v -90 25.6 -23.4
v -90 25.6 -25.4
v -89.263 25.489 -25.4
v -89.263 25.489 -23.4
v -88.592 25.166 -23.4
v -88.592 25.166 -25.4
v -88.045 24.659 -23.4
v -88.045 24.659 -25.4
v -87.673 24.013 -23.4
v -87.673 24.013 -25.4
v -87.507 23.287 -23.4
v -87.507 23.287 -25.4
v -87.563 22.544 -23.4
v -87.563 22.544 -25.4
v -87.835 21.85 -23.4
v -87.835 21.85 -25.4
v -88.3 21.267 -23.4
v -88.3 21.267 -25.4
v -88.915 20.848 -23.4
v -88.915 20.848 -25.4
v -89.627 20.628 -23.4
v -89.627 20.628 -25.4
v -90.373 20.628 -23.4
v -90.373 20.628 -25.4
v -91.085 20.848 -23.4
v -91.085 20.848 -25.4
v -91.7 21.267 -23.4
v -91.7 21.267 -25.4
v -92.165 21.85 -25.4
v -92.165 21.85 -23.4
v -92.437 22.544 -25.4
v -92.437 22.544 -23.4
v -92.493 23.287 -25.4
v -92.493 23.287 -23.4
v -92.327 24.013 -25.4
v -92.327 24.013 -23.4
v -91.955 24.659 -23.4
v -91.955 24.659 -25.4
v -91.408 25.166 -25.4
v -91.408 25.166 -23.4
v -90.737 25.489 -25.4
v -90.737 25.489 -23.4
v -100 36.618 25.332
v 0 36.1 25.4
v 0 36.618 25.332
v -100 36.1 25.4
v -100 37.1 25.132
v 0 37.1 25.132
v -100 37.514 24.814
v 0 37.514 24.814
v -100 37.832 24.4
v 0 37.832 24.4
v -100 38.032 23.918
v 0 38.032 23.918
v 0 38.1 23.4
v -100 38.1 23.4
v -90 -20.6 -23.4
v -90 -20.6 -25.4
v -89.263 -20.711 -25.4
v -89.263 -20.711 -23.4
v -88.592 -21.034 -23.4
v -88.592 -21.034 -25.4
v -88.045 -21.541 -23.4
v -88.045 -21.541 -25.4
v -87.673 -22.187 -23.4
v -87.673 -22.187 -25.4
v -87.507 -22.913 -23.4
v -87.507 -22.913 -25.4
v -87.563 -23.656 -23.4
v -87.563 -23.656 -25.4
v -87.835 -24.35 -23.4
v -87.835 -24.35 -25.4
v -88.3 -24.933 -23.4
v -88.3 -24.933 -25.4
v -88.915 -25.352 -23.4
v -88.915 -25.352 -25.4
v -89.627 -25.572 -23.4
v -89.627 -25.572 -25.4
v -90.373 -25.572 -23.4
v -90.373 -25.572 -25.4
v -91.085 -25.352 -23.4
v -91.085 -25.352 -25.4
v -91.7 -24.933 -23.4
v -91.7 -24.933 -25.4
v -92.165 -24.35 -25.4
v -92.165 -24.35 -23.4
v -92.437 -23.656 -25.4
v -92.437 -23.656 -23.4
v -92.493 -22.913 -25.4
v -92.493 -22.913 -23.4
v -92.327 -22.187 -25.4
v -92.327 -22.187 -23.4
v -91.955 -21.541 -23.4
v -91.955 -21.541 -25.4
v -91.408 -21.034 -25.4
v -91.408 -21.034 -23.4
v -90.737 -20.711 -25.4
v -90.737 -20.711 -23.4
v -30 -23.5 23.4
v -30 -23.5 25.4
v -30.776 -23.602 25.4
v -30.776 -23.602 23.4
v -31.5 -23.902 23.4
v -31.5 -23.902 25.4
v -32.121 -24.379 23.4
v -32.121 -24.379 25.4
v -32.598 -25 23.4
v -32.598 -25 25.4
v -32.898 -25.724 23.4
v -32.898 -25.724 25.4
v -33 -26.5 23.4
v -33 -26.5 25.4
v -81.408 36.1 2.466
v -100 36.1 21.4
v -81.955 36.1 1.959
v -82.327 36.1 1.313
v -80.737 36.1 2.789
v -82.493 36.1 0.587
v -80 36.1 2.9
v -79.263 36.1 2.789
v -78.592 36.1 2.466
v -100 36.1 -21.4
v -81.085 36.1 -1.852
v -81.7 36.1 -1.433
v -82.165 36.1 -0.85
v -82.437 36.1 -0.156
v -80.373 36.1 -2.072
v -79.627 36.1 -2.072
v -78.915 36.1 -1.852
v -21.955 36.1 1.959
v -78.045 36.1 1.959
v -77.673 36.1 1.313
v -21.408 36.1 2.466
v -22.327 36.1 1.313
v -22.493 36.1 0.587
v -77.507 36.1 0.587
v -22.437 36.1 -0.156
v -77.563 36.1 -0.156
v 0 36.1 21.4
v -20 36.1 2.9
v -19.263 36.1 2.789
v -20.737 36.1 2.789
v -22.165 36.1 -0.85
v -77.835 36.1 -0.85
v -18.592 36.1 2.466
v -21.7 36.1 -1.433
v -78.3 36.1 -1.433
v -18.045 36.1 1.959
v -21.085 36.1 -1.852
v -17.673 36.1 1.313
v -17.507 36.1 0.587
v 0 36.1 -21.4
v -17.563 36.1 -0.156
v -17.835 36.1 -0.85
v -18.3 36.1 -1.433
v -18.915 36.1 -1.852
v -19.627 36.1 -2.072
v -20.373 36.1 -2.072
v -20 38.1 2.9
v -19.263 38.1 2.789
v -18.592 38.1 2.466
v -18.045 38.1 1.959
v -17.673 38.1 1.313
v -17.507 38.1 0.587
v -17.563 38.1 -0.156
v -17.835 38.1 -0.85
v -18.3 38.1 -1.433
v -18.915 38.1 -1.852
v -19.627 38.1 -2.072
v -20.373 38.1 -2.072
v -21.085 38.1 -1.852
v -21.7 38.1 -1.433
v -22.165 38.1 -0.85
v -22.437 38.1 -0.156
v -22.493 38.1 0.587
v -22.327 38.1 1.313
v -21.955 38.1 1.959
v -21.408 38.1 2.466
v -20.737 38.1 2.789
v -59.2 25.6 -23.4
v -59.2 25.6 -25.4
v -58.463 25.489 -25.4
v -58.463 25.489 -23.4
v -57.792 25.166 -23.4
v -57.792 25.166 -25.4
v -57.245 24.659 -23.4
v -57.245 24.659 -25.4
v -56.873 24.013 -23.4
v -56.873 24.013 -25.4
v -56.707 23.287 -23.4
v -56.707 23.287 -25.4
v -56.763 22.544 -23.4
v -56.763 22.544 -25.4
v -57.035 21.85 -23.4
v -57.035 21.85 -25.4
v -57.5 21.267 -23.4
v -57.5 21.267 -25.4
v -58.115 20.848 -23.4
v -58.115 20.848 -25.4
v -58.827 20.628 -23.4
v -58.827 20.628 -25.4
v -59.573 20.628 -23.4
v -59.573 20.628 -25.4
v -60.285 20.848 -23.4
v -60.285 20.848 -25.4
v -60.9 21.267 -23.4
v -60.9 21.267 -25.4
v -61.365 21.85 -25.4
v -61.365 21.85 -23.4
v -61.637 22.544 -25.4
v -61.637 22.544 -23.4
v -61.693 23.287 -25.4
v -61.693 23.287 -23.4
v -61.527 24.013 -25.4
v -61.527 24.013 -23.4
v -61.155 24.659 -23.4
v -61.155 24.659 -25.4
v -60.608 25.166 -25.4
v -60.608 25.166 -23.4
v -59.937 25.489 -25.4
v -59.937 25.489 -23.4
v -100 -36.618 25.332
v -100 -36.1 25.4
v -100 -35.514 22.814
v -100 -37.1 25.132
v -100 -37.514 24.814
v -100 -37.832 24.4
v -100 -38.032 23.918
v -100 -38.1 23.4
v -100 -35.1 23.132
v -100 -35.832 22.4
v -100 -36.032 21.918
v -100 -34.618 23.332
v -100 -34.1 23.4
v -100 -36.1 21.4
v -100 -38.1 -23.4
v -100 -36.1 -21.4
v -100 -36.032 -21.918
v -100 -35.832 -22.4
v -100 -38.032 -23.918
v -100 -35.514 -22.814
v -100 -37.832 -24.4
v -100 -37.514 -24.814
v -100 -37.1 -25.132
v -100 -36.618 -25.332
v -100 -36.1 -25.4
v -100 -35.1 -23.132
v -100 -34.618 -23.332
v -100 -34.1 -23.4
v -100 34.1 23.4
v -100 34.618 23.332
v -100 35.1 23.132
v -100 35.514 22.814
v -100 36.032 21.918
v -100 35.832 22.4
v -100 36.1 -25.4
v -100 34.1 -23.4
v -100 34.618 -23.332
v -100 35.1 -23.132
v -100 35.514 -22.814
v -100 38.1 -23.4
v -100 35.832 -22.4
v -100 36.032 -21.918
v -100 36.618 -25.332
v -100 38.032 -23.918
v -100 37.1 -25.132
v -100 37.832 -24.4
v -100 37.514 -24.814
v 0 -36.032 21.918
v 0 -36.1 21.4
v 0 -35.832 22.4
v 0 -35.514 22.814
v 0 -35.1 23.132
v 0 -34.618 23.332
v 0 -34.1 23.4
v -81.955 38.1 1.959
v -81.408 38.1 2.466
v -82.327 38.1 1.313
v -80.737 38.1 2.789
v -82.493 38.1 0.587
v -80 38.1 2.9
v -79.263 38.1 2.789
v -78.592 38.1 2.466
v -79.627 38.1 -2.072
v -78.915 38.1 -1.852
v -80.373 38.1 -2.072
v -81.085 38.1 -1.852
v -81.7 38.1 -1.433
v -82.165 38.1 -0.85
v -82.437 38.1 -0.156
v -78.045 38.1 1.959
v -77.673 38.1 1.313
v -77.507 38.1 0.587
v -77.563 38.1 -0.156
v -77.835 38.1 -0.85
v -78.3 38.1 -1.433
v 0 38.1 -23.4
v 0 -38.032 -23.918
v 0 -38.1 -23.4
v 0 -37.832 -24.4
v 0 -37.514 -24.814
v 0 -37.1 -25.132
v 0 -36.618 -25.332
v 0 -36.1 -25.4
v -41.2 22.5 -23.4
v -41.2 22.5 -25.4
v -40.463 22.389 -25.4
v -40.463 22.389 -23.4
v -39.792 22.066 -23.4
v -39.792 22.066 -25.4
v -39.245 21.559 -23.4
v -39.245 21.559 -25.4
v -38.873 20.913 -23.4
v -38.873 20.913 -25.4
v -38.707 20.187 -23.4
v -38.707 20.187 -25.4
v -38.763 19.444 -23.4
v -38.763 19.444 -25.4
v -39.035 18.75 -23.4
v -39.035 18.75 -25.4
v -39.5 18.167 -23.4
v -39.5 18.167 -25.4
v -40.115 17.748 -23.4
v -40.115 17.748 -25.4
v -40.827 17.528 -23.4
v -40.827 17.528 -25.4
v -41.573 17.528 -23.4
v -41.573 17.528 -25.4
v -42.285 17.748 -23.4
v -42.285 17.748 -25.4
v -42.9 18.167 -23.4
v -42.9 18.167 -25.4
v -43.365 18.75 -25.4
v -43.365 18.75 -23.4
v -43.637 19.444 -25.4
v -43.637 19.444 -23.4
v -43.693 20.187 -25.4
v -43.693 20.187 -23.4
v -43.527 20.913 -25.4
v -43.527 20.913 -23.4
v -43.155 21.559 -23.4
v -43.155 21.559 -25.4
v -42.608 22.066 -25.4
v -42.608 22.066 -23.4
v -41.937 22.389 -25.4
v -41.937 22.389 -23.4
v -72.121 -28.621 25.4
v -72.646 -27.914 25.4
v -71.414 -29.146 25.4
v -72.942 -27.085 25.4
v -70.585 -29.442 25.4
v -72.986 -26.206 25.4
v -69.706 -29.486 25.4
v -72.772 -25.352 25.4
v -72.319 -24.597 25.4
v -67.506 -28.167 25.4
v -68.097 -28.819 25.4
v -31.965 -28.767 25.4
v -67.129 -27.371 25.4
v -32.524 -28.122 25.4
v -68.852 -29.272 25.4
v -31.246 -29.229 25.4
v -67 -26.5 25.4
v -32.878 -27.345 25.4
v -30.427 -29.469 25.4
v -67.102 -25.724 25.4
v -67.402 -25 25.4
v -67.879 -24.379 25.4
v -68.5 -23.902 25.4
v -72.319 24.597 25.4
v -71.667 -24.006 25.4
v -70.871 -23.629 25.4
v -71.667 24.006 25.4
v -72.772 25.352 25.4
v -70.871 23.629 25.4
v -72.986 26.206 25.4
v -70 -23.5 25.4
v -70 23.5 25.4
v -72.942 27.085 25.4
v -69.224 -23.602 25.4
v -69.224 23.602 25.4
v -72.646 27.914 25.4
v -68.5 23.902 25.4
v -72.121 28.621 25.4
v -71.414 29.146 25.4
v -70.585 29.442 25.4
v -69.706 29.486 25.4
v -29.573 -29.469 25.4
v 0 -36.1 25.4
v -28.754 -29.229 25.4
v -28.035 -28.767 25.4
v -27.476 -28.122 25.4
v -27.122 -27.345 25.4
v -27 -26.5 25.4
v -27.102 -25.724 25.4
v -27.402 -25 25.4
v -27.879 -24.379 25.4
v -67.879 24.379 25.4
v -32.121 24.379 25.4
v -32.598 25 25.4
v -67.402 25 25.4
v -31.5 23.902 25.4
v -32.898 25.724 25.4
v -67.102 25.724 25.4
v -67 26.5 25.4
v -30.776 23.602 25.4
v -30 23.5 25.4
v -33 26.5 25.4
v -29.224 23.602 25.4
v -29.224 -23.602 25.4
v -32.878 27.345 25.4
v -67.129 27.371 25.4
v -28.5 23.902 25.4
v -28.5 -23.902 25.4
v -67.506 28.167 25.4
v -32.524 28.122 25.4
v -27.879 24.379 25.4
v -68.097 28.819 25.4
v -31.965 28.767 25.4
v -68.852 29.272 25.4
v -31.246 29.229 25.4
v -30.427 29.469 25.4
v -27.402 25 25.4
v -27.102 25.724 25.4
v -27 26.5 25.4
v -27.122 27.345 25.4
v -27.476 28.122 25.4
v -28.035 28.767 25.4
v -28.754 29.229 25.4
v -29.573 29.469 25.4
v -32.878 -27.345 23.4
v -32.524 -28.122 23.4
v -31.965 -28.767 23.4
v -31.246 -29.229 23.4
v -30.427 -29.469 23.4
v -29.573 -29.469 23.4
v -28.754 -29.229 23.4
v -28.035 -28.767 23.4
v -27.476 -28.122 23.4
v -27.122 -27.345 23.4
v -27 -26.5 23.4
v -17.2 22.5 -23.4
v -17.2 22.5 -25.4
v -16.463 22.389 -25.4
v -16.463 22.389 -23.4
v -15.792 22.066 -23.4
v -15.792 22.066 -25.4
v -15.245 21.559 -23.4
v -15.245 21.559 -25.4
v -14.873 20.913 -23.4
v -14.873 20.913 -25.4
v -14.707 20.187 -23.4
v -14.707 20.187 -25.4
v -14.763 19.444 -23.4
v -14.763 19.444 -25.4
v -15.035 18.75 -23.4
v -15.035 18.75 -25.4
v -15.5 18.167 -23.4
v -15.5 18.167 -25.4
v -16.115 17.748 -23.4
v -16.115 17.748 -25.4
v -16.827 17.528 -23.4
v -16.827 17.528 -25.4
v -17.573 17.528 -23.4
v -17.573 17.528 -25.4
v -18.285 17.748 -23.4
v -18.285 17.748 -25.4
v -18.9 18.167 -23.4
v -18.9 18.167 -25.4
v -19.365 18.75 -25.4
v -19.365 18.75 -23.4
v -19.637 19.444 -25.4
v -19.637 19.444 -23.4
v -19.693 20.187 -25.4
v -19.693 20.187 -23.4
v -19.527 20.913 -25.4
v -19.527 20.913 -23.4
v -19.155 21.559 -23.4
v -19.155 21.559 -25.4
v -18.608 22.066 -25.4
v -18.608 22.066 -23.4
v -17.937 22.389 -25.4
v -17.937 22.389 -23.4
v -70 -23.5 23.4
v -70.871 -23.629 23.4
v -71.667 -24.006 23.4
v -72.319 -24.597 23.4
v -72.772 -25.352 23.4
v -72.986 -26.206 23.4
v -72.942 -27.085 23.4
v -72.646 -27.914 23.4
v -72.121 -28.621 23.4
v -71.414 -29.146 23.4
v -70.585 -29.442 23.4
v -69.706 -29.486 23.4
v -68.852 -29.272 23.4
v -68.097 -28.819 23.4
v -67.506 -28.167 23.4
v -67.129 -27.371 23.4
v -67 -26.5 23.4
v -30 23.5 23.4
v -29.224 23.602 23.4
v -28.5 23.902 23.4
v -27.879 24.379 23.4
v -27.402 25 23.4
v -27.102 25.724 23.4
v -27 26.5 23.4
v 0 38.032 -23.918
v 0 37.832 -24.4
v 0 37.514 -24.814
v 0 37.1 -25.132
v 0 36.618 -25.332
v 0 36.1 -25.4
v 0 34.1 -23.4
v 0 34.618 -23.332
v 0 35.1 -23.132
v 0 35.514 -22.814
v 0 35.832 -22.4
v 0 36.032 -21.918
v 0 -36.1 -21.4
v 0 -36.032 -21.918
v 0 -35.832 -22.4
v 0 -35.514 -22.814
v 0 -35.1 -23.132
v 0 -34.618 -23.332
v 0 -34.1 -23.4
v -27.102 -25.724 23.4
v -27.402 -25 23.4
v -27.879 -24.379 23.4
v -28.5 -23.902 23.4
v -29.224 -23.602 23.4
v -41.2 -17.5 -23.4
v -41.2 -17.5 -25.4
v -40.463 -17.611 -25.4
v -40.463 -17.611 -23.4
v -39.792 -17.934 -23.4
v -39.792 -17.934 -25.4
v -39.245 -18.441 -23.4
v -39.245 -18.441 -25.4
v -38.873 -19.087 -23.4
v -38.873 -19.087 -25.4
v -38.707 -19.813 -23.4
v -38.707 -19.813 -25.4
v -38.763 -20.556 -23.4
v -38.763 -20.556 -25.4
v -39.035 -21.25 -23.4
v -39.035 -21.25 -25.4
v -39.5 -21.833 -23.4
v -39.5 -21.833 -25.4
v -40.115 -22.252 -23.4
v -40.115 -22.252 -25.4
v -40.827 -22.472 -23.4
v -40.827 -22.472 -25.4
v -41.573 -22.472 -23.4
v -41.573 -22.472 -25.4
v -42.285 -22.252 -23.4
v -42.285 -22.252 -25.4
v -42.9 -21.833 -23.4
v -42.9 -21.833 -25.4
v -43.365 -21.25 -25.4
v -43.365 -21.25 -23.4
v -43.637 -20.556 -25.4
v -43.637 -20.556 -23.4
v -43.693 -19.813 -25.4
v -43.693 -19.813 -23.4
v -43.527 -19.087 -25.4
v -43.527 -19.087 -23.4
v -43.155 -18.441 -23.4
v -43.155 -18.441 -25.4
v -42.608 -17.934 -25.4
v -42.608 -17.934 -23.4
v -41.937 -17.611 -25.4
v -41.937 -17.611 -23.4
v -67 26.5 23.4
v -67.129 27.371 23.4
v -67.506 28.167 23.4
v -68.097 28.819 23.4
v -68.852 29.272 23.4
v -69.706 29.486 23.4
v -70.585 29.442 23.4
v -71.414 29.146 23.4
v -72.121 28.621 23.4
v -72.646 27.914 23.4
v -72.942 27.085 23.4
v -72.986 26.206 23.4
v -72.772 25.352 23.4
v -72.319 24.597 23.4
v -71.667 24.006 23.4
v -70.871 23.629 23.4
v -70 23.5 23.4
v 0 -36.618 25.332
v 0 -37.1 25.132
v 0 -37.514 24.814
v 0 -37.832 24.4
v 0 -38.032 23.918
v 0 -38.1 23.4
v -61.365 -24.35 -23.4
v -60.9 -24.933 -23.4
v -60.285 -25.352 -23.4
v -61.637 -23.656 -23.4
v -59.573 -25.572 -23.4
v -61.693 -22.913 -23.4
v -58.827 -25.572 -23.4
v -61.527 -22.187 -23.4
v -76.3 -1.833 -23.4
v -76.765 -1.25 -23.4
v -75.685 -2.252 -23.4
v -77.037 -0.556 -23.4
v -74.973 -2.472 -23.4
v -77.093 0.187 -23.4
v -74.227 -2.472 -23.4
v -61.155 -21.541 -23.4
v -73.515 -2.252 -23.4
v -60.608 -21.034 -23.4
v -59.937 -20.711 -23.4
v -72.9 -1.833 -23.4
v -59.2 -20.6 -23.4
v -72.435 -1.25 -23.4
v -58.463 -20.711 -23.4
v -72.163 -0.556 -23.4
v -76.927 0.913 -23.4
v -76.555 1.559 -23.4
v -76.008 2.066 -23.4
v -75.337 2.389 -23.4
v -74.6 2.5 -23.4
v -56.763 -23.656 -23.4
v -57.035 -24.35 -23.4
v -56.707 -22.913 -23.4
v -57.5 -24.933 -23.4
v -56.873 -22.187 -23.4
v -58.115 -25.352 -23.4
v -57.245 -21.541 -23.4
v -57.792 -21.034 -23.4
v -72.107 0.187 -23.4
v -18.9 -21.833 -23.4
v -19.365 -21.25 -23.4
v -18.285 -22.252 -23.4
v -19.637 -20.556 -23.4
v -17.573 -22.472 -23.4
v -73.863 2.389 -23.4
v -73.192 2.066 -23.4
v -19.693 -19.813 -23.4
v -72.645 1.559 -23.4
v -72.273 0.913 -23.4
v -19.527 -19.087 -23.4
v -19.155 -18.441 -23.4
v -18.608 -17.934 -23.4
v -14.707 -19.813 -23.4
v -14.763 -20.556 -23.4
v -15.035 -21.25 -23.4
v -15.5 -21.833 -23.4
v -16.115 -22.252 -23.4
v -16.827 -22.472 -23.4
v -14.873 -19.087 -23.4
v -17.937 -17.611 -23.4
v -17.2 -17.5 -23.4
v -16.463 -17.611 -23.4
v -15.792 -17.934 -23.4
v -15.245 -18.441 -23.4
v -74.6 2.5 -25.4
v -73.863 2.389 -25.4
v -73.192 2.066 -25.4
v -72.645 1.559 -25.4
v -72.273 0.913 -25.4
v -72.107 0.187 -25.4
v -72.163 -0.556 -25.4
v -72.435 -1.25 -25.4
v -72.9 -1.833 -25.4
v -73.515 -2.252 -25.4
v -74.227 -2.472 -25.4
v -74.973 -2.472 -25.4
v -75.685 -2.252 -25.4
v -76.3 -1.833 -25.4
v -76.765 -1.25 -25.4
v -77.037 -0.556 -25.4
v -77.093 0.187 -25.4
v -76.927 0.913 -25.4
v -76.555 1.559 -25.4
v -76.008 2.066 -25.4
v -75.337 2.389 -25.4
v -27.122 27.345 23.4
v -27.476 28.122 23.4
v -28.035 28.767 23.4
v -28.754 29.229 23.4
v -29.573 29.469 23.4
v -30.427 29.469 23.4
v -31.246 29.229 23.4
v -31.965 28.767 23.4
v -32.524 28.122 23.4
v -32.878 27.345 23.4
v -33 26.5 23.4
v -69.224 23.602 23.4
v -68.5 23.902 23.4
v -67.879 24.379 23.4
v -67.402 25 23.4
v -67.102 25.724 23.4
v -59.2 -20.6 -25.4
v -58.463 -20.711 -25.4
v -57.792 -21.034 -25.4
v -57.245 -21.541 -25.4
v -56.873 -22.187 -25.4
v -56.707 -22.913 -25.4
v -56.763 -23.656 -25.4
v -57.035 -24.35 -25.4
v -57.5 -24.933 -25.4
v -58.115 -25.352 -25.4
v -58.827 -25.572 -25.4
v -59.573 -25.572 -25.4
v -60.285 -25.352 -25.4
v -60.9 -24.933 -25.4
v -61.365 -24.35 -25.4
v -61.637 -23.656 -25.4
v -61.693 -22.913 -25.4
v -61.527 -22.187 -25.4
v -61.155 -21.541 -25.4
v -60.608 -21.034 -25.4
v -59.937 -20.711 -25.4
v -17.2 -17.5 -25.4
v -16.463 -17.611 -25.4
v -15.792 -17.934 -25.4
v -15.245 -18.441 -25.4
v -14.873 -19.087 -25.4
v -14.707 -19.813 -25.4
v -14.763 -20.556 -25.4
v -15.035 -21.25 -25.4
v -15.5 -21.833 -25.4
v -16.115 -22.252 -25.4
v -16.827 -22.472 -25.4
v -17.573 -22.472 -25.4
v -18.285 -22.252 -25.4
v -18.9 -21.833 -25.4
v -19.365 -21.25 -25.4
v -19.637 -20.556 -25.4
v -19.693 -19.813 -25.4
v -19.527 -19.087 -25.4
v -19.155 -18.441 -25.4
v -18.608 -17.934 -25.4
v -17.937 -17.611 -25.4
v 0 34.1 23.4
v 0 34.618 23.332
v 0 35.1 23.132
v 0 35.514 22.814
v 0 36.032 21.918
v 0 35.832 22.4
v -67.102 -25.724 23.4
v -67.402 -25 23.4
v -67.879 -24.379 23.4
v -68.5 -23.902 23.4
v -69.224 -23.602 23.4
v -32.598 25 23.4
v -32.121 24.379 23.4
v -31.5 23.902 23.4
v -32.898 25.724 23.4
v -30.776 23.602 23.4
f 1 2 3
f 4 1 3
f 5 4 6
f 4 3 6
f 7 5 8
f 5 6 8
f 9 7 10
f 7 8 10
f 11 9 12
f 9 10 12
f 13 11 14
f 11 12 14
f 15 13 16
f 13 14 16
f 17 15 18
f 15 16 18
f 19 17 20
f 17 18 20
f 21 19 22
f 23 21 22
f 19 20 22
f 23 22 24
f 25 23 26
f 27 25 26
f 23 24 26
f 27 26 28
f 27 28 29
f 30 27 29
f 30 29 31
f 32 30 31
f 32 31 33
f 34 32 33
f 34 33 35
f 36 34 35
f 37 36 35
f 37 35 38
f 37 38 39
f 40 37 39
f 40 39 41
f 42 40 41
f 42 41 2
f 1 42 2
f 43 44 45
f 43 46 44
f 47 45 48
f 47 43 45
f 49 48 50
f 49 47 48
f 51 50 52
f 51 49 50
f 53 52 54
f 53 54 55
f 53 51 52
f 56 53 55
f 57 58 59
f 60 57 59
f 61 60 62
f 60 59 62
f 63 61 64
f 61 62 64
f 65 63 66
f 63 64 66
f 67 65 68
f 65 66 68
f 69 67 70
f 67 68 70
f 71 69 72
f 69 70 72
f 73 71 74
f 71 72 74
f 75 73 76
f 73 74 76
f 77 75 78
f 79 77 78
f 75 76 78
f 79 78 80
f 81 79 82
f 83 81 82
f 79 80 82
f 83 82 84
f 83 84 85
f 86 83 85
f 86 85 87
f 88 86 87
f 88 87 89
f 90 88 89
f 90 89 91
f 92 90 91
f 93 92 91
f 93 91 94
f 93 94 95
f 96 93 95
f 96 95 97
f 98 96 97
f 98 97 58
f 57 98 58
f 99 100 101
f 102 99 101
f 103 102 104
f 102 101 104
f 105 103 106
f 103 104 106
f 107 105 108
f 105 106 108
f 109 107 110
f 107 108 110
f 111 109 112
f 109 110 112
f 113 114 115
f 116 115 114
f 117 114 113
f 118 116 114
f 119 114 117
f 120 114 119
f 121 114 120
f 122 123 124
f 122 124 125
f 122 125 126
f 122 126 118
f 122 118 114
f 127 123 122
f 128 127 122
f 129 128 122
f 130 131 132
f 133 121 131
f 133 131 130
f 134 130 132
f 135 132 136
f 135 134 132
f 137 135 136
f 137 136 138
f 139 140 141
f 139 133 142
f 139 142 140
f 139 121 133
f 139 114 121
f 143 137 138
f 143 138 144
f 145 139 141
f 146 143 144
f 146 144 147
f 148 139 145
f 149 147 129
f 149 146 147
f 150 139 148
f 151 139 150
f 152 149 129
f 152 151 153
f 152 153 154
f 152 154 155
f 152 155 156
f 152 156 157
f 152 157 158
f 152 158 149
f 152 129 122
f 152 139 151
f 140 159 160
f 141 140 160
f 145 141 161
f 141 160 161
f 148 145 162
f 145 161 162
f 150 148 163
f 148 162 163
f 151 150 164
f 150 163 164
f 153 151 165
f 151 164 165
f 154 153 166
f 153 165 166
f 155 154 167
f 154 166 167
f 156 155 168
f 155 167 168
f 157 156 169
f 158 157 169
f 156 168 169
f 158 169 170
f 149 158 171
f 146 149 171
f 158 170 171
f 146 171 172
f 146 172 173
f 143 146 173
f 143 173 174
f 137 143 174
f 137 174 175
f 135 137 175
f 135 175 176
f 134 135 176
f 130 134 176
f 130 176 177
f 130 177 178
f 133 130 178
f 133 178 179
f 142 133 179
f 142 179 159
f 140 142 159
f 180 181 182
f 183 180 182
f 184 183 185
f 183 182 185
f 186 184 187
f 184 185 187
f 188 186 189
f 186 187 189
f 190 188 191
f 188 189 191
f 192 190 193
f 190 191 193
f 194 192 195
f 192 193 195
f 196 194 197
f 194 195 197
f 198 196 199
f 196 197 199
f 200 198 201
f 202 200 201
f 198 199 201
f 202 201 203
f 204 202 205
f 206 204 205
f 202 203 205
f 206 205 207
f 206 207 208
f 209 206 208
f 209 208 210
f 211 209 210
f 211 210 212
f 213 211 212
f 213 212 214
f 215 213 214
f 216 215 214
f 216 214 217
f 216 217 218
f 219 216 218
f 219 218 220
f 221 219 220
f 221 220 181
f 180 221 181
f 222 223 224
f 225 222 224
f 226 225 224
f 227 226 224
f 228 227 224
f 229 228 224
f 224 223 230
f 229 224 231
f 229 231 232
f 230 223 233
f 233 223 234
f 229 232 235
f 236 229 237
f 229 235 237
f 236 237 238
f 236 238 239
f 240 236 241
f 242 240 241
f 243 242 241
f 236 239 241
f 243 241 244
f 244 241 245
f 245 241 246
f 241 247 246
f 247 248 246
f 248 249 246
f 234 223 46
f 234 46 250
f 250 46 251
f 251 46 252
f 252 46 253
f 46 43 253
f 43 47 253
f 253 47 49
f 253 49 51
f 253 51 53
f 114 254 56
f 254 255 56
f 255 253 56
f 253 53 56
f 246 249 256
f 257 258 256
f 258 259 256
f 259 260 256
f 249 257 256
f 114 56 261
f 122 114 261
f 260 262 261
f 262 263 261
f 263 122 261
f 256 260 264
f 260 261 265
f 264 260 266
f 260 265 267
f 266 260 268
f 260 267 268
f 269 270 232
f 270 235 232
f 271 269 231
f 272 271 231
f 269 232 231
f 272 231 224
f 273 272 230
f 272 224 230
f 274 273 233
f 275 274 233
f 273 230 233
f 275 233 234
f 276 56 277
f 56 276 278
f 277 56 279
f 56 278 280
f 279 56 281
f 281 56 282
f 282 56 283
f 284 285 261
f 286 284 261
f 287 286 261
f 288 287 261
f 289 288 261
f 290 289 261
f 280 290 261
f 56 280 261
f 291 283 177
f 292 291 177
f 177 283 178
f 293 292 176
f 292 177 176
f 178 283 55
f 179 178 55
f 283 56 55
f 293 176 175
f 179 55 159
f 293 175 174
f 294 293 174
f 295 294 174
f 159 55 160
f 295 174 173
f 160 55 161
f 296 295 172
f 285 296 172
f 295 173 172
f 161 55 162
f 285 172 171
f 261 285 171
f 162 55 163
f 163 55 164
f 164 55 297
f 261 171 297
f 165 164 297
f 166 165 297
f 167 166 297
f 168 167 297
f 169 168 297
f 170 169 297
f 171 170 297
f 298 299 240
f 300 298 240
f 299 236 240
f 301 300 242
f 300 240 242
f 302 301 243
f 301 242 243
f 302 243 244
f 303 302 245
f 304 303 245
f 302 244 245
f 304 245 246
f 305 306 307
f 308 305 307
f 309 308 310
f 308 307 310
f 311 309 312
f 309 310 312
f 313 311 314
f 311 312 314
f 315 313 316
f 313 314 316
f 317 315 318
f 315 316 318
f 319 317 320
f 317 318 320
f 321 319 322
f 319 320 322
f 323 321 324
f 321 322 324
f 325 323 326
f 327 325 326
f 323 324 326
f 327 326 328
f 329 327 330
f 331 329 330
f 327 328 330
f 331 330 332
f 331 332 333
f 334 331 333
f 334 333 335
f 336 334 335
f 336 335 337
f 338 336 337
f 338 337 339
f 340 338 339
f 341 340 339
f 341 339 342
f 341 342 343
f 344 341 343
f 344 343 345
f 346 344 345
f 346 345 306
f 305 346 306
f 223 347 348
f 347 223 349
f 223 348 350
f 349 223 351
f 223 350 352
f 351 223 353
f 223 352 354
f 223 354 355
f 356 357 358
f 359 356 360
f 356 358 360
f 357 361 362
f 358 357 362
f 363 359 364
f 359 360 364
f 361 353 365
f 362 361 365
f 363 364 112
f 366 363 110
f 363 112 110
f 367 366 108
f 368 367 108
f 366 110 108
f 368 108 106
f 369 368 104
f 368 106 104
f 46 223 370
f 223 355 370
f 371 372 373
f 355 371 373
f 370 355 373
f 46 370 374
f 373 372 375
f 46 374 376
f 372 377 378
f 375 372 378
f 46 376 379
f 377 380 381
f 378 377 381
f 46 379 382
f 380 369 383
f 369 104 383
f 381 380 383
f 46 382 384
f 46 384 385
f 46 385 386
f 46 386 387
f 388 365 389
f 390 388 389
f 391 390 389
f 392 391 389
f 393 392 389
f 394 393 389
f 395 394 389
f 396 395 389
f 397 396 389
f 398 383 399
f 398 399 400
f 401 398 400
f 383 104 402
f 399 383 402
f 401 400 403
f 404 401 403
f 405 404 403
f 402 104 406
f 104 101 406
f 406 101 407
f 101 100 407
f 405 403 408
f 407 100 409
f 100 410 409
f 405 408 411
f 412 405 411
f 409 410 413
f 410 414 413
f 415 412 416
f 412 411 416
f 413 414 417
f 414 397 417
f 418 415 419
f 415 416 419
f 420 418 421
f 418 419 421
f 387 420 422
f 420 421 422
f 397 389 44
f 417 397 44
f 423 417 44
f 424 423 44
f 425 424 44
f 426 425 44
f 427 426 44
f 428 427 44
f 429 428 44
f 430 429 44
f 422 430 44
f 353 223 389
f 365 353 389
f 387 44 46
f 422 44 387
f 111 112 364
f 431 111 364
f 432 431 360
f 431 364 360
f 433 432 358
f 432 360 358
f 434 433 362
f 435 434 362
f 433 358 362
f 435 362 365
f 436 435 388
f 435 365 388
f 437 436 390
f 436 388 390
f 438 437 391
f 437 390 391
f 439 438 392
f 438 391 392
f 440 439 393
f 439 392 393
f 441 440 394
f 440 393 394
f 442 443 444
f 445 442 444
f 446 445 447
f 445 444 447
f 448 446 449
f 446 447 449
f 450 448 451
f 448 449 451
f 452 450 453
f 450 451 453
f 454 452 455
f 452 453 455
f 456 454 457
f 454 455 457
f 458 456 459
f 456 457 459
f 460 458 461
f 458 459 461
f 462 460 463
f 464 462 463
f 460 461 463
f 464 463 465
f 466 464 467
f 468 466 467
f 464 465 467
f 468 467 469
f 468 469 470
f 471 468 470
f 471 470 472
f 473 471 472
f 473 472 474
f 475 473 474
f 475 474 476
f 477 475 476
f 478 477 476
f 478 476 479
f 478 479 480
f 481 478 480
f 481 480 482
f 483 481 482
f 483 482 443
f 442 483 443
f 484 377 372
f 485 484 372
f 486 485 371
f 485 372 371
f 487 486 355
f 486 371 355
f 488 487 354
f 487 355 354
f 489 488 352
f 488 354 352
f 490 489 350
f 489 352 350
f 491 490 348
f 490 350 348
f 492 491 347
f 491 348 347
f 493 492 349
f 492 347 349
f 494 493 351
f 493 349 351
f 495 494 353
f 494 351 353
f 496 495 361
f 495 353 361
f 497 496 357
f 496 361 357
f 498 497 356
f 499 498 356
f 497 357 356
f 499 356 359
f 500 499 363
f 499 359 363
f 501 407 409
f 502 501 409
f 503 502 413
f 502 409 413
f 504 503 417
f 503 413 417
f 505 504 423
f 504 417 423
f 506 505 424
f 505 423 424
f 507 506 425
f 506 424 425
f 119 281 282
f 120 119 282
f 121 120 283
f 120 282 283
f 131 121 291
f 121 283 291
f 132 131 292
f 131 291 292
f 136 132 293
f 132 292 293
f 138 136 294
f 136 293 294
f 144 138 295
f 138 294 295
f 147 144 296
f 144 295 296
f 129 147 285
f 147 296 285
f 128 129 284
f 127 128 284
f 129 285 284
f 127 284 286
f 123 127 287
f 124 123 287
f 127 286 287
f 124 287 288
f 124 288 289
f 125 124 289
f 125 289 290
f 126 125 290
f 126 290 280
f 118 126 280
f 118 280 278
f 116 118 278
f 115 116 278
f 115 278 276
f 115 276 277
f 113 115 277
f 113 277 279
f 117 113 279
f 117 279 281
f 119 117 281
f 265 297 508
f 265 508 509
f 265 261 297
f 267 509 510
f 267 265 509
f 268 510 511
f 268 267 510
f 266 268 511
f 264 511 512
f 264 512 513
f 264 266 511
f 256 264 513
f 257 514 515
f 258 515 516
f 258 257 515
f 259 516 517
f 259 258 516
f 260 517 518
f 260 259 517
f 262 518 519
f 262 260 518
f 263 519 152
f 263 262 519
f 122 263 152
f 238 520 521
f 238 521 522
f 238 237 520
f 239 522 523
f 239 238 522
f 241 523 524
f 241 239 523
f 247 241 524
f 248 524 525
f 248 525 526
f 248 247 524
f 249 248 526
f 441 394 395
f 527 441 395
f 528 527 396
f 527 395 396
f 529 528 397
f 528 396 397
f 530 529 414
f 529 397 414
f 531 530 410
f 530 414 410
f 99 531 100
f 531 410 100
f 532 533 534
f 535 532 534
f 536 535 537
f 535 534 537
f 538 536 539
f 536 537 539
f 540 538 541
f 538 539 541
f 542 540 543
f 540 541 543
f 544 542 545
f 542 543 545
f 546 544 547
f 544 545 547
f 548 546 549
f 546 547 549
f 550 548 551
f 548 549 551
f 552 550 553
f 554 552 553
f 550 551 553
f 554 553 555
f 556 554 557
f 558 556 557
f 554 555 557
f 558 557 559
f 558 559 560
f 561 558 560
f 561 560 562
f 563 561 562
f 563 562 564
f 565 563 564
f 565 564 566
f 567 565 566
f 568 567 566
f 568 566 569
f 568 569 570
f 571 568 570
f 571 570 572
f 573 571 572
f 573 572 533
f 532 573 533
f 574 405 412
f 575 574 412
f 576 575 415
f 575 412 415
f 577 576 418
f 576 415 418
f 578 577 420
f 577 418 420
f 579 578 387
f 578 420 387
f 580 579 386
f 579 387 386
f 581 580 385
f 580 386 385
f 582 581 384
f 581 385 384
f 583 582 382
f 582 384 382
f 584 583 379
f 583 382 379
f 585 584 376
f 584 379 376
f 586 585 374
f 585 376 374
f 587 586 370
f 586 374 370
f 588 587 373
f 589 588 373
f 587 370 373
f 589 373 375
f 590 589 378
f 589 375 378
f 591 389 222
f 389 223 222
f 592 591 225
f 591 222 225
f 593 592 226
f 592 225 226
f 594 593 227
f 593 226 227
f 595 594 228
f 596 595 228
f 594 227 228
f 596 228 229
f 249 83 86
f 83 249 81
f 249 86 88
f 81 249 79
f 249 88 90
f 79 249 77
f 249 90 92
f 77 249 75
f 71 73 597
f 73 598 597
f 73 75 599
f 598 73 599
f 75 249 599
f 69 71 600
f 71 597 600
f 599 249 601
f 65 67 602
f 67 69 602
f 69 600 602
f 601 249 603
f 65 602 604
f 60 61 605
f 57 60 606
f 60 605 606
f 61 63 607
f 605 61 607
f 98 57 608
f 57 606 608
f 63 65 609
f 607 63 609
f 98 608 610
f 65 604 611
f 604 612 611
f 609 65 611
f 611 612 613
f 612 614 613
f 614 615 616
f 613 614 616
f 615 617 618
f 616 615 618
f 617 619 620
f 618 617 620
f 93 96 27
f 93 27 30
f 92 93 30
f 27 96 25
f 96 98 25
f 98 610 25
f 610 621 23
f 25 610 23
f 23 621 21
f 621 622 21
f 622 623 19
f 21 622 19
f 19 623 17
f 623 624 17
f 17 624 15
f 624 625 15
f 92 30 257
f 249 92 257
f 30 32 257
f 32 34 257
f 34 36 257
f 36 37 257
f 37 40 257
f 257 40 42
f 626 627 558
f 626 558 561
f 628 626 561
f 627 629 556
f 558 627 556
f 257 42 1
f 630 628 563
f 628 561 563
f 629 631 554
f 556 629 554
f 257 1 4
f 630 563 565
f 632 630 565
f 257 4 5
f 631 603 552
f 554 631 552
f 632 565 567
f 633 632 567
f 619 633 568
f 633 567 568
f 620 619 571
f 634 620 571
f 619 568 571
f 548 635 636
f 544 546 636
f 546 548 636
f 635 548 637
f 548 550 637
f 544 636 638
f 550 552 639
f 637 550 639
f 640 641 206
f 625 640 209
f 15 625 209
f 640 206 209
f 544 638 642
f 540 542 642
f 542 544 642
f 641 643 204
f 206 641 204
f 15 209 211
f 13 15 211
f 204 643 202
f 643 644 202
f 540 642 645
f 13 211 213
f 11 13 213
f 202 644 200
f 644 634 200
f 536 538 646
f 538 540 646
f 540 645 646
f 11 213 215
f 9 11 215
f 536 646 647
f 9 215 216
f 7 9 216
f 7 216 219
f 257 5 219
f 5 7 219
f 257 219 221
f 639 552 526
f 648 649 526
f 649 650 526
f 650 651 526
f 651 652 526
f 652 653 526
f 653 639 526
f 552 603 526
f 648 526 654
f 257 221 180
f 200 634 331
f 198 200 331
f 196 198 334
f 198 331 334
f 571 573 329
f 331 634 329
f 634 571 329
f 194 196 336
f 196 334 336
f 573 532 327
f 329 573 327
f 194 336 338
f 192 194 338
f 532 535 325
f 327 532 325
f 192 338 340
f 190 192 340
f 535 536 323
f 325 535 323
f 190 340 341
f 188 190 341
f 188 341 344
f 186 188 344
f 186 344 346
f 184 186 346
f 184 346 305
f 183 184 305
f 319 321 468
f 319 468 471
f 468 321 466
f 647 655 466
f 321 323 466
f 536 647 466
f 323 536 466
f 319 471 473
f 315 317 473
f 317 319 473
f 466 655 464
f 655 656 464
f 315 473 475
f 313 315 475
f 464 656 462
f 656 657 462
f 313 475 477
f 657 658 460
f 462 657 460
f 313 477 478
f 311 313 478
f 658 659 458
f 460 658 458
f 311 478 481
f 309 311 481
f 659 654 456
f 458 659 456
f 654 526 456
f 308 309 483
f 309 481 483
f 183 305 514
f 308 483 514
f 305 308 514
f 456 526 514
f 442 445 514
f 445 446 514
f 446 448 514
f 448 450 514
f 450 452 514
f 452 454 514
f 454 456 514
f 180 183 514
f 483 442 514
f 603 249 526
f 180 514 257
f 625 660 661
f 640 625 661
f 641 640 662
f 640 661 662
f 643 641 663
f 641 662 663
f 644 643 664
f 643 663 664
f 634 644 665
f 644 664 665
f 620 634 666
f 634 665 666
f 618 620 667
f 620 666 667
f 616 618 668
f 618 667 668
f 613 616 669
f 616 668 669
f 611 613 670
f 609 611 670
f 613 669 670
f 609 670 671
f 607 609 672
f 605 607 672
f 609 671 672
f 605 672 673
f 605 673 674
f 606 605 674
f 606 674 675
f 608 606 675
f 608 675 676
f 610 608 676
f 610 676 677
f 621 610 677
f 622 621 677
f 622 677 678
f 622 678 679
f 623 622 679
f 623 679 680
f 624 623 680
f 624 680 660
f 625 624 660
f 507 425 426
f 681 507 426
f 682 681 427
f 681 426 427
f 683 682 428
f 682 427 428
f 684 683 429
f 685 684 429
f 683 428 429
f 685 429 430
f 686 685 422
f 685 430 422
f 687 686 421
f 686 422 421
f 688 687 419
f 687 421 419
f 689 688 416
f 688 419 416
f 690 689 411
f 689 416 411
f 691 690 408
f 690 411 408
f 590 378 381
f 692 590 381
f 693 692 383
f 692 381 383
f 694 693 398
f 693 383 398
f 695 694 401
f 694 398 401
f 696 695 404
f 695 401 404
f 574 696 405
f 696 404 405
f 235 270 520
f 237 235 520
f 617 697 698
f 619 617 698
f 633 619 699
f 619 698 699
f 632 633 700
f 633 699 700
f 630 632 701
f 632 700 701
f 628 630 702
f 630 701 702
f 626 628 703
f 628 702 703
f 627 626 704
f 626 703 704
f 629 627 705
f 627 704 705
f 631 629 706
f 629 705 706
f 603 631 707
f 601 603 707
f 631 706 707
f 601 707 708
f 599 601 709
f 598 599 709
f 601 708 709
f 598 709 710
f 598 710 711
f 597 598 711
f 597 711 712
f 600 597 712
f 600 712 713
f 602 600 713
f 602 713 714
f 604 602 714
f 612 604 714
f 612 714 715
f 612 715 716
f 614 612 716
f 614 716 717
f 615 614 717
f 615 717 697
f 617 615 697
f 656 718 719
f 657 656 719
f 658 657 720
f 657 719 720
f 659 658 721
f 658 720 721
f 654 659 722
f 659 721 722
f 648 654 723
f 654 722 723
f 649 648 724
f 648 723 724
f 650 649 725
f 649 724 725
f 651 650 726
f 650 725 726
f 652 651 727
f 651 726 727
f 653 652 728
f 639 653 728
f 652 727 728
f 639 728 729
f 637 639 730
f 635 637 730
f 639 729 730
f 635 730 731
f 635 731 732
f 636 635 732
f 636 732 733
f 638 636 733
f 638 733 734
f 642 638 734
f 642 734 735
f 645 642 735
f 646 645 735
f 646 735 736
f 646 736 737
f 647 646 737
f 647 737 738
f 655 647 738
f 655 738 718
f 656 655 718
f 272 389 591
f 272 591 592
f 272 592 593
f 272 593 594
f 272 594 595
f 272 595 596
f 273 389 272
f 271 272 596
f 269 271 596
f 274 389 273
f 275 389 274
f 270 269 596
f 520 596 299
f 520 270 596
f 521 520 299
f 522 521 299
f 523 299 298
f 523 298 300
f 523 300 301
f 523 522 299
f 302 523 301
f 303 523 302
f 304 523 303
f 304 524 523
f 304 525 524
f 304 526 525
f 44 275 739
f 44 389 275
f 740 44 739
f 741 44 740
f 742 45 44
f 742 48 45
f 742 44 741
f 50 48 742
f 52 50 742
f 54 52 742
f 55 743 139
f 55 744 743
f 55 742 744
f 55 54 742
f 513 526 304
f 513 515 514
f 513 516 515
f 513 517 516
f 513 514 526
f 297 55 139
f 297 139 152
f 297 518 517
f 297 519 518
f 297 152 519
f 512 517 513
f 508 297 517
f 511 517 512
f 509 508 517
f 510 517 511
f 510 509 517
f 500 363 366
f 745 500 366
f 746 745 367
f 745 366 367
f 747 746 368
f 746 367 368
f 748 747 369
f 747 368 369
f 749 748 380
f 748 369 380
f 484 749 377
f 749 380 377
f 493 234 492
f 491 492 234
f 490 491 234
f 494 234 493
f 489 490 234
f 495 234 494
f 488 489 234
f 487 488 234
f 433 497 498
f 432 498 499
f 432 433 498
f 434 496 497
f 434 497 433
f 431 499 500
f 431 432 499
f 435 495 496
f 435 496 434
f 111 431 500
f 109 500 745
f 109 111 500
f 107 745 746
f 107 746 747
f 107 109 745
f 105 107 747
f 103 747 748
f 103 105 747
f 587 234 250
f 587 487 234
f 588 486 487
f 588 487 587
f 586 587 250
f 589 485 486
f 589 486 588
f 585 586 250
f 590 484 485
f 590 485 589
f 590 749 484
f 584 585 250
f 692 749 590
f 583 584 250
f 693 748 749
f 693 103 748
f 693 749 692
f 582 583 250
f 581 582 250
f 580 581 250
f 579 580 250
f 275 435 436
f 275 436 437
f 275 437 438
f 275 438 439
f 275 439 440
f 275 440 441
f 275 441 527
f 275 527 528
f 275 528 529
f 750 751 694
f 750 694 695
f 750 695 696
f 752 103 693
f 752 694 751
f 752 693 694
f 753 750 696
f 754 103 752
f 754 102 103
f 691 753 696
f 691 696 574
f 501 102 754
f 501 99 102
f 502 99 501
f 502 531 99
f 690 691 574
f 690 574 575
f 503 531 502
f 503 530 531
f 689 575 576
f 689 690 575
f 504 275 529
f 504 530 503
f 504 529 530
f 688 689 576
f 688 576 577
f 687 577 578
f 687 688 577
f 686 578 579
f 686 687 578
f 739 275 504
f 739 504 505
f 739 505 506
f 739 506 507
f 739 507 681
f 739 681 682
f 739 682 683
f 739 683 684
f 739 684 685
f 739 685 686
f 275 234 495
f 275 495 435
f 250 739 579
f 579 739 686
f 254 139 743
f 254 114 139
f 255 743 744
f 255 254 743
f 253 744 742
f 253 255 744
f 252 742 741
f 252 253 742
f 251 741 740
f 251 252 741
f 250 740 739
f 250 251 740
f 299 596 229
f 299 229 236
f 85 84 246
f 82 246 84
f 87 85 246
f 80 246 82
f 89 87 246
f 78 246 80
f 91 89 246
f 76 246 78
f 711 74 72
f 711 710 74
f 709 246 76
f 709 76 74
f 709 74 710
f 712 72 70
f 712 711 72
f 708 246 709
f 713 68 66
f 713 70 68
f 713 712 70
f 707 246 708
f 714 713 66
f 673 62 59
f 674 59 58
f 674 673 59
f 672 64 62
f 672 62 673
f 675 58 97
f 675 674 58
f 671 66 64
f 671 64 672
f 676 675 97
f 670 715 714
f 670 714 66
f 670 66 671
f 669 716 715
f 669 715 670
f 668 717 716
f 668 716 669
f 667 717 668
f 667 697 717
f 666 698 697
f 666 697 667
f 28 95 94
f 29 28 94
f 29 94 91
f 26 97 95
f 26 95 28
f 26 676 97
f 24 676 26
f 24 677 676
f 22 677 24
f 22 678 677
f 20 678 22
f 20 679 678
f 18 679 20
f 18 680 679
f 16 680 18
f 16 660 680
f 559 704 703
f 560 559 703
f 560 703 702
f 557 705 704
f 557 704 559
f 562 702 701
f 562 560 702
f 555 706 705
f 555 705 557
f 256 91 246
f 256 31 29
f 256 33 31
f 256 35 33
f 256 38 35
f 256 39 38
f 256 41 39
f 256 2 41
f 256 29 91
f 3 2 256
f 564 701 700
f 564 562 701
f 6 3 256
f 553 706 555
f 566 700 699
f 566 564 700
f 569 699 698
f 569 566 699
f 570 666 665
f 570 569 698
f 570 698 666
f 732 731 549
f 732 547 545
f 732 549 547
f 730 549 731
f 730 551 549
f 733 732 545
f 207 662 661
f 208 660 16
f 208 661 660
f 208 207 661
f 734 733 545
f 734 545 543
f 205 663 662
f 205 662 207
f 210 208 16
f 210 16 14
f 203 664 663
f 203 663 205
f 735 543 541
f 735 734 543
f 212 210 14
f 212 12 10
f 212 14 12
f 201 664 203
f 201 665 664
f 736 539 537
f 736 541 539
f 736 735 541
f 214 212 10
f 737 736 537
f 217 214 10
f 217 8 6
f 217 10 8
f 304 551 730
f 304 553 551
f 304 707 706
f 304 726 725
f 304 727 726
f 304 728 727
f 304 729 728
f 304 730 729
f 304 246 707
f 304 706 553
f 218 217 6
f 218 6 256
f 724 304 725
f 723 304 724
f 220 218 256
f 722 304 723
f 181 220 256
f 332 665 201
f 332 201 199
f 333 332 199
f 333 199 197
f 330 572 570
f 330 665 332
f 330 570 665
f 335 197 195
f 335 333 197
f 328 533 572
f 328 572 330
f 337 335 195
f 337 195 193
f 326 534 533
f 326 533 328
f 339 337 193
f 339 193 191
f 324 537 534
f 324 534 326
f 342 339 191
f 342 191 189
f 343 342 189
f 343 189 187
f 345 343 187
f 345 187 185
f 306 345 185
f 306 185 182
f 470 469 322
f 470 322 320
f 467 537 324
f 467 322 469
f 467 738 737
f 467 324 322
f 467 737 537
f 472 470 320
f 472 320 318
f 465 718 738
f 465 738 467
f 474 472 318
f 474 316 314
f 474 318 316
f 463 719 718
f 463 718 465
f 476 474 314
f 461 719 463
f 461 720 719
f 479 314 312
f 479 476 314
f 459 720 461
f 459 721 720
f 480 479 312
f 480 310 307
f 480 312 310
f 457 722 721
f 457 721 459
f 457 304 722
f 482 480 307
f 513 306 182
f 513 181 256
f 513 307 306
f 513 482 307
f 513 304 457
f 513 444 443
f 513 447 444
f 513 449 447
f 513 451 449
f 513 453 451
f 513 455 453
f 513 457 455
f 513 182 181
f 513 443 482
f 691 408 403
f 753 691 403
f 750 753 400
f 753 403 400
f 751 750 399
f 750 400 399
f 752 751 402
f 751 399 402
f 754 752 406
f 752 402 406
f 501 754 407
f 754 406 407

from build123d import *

# Parameters (mm, degrees)
SKETCH1_W             = 50.8
SKETCH1_H             = 76.2
BOSS_EXTRUDE1_DEPTH   = 100
SKETCH2_W             = 46.8
SKETCH2_H             = 72.2
CUT_EXTRUDE1_DEPTH    = 110.985317202
FILLET2_R             = 2
CORTAR_EXTRUIR2_DEPTH = 10
CROQUIS4_R            = 2.5
CORTAR_EXTRUIR5_DEPTH = 10
CROQUIS6_R            = 2.5
CORTAR_EXTRUIR6_DEPTH = 10
CROQUIS7_R            = 2.5
CORTAR_EXTRUIR7_DEPTH = 10


with BuildPart() as part:
    # Sketch1 → Boss-Extrude1 (new body)
    with BuildSketch(Plane(origin=(0, 0, 0), x_dir=(0, 0, -1), z_dir=(1, 0, 0))):
        Rectangle(SKETCH1_W, SKETCH1_H)
    extrude(amount=-BOSS_EXTRUDE1_DEPTH)

    # Sketch2 → Cut-Extrude1 (cut, through all)
    with BuildSketch(Plane(origin=(0, 0, 0), x_dir=(0, 0, -1), z_dir=(1, 0, 0))):
        Rectangle(SKETCH2_W, SKETCH2_H)
    extrude(amount=-CUT_EXTRUDE1_DEPTH, mode=Mode.SUBTRACT)

    # Fillet2
    fillet2_edges = [part.edges().sort_by_distance(p)[0] for p in [
        (-50, -36.1, 23.4),
        (-50, 36.1, 23.4),
        (-50, 36.1, -23.4),
        (-50, -36.1, -23.4),
        (-50, 38.1, 25.4),
        (-50, 38.1, -25.4),
        (-50, -38.1, -25.4),
        (-50, -38.1, 25.4),
    ]]
    fillet(fillet2_edges, radius=FILLET2_R)

    # Croquis2 → Cortar-Extruir2 (cut)
    with BuildSketch(Plane.XY.offset(25.4)):
        with BuildLine():
            ThreePointArc((-27, 26.5), (-30, 29.5), (-33, 26.5))
            Line((-33, 26.5), (-30, 26.5))
            Line((-30, 26.5), (-30, 23.5))
            ThreePointArc((-30, 23.5), (-27.878679656, 24.378679656), (-27, 26.5))
        make_face()
        with BuildLine():
            Line((-30, 26.5), (-33, 26.5))
            ThreePointArc((-33, 26.5), (-32.121320344, 24.378679656), (-30, 23.5))
            Line((-30, 23.5), (-30, 26.5))
        make_face()
        with BuildLine():
            ThreePointArc((-70, 23.5), (-67.878679656, 24.378679656), (-67, 26.5))
            Line((-67, 26.5), (-70, 26.5))
            Line((-70, 26.5), (-70, 23.5))
        make_face()
        with BuildLine():
            Line((-70, 26.5), (-67, 26.5))
            ThreePointArc((-67, 26.5), (-72.121320344, 28.621320344), (-70, 23.5))
            Line((-70, 23.5), (-70, 26.5))
        make_face()
        with BuildLine():
            ThreePointArc((-67, -26.5), (-67.878679656, -24.378679656), (-70, -23.5))
            Line((-70, -23.5), (-70, -26.5))
            Line((-70, -26.5), (-67, -26.5))
        make_face()
        with BuildLine():
            Line((-70, -26.5), (-70, -23.5))
            ThreePointArc((-70, -23.5), (-72.121320344, -28.621320344), (-67, -26.5))
            Line((-67, -26.5), (-70, -26.5))
        make_face()
        with BuildLine():
            ThreePointArc((-27, -26.5), (-27.878679656, -24.378679656), (-30, -23.5))
            Line((-30, -23.5), (-30, -26.5))
            Line((-30, -26.5), (-33, -26.5))
            ThreePointArc((-33, -26.5), (-30, -29.5), (-27, -26.5))
        make_face()
        with BuildLine():
            Line((-30, -26.5), (-30, -23.5))
            ThreePointArc((-30, -23.5), (-32.121320344, -24.378679656), (-33, -26.5))
            Line((-33, -26.5), (-30, -26.5))
        make_face()
    extrude(amount=-CORTAR_EXTRUIR2_DEPTH, mode=Mode.SUBTRACT)

    # Croquis4 → Cortar-Extruir5 (cut)
    with BuildSketch(Plane(origin=(0, 0, -25.4), x_dir=(-1, 0, 0), z_dir=(0, 0, -1))):
        with Locations(Location((90, 23.1, 0), (0, 0, 90))):
            Circle(CROQUIS4_R)
        with Locations(Location((59.2, 23.1, 0), (0, 0, 90))):
            Circle(CROQUIS4_R)
        with Locations(Location((59.2, -23.1, 0), (0, 0, 90))):
            Circle(CROQUIS4_R)
        with Locations(Location((90, -23.1, 0), (0, 0, 90))):
            Circle(CROQUIS4_R)
        with Locations(Location((74.6, 0, 0), (0, 0, 90))):
            Circle(CROQUIS4_R)
    extrude(amount=-CORTAR_EXTRUIR5_DEPTH, mode=Mode.SUBTRACT)

    # Croquis6 → Cortar-Extruir6 (cut)
    with BuildSketch(Plane(origin=(0, 0, -25.4), x_dir=(-1, 0, 0), z_dir=(0, 0, -1))):
        with Locations(Location((17.2, 20, 0), (0, 0, 90))):
            Circle(CROQUIS6_R)
        with Locations(Location((17.2, -20, 0), (0, 0, 90))):
            Circle(CROQUIS6_R)
        with Locations(Location((41.2, -20, 0), (0, 0, 90))):
            Circle(CROQUIS6_R)
        with Locations(Location((41.2, 20, 0), (0, 0, 90))):
            Circle(CROQUIS6_R)
    extrude(amount=-CORTAR_EXTRUIR6_DEPTH, mode=Mode.SUBTRACT)

    # Croquis7 → Cortar-Extruir7 (cut)
    with BuildSketch(Plane(origin=(0, 38.1, 0), x_dir=(1, 0, 0), z_dir=(0, 1, 0))):
        with Locations(Location((-80, -0.4, 0), (0, 0, 270))):
            Circle(CROQUIS7_R)
        with Locations(Location((-20, -0.4, 0), (0, 0, 270))):
            Circle(CROQUIS7_R)
    extrude(amount=-CORTAR_EXTRUIR7_DEPTH, mode=Mode.SUBTRACT)


solid = part.part
